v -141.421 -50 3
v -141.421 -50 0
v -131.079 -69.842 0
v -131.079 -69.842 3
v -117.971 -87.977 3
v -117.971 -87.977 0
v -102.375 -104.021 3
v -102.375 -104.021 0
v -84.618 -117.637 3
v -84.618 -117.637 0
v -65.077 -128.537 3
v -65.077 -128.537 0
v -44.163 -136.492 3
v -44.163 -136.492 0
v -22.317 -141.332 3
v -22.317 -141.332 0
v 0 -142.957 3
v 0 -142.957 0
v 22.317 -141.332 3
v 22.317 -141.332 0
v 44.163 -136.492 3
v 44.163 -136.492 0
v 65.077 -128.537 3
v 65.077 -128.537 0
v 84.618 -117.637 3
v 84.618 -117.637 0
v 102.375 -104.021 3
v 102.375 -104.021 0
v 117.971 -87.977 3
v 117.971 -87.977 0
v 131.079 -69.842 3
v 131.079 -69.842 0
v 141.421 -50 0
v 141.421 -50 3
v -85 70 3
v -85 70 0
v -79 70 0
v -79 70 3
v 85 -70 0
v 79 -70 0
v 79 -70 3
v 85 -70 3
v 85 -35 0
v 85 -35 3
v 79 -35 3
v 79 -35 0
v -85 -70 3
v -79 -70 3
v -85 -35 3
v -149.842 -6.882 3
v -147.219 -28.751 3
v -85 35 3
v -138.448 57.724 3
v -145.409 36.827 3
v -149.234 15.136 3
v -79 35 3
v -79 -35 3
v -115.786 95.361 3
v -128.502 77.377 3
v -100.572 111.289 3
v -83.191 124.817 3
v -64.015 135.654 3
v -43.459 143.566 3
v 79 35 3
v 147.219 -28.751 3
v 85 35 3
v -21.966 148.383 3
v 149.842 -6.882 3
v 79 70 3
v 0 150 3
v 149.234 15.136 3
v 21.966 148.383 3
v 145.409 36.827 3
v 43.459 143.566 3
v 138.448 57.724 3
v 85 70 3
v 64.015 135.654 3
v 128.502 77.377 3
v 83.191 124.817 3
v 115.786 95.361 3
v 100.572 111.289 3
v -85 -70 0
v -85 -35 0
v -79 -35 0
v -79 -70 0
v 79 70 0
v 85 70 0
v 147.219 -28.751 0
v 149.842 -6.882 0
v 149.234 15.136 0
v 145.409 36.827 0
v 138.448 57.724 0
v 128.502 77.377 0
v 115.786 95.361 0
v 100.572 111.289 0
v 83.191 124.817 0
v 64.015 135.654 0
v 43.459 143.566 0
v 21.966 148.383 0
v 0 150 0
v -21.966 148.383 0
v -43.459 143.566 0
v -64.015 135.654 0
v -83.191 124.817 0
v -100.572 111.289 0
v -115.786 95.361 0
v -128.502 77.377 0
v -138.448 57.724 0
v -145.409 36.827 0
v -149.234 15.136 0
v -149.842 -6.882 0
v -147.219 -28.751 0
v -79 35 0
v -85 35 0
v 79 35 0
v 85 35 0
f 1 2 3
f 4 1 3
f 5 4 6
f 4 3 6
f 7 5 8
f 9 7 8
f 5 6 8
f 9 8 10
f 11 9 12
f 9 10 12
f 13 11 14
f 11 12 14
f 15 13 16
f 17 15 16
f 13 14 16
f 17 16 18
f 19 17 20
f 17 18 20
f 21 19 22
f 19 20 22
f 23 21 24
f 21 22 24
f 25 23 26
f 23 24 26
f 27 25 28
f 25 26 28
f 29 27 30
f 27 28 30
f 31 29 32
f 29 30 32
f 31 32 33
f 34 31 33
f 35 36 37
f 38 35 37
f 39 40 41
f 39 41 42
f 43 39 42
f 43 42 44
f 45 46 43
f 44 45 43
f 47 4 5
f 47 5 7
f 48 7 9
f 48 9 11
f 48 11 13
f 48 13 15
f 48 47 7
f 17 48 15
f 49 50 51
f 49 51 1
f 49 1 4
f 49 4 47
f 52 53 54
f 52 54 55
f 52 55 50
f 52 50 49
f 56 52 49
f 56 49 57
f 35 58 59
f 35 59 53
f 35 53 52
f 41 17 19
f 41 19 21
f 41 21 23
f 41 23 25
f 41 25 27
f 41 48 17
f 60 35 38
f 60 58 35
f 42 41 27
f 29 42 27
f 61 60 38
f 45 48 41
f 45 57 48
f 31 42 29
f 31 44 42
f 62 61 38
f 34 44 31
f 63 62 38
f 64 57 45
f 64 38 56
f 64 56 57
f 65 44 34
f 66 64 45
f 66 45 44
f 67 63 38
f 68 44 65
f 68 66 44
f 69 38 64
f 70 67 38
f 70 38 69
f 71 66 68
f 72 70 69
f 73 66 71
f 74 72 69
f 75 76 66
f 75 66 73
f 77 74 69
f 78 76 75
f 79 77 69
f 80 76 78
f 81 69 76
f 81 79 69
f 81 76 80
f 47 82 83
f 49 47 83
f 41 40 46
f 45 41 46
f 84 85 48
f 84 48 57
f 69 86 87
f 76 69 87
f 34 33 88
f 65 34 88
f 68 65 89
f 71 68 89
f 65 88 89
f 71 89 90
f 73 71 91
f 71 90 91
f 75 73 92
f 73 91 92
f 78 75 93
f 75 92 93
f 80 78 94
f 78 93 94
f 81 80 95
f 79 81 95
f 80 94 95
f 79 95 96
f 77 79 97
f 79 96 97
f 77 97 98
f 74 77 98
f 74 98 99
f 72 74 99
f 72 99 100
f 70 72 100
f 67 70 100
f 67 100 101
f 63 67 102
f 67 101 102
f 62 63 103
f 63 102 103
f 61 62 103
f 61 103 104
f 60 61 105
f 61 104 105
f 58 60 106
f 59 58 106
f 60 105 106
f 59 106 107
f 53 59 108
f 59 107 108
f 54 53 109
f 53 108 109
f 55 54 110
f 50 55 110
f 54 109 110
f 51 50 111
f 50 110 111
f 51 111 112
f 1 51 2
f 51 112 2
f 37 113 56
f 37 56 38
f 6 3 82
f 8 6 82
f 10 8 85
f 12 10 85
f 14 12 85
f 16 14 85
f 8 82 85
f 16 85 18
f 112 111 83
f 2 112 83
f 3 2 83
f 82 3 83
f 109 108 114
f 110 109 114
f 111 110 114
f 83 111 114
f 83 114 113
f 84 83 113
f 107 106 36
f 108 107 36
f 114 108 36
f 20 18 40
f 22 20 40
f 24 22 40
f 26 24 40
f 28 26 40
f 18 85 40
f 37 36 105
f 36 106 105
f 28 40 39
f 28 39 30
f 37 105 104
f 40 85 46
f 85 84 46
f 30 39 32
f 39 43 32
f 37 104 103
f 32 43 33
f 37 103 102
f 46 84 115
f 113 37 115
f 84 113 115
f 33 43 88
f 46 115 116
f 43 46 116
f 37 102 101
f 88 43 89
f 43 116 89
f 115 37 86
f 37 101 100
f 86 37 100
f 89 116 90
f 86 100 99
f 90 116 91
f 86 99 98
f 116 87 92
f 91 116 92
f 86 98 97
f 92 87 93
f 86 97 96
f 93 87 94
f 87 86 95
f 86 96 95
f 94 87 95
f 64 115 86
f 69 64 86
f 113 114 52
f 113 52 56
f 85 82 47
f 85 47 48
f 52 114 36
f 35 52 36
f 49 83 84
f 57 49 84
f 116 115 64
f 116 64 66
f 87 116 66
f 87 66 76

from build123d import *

# Parameters (mm, degrees)
ESBO_O1_W                = 6
ESBO_O1_H                = 35
RESSALTO_EXTRUS_O1_DEPTH = 3


with BuildPart() as part:
    # Esboço1 → Ressalto-extrusão1 (new body)
    with BuildSketch(Plane.XY):
        with BuildLine():
            ThreePointArc((141.421356237, -50), (0, 150), (-141.421356237, -50))
            ThreePointArc((-141.421356237, -50), (0, -142.957457878), (141.421356237, -50))
        make_face()
        with Locations((-82, -52.5)):
            Rectangle(ESBO_O1_W, ESBO_O1_H, mode=Mode.SUBTRACT)
        with Locations((-82, 52.5)):
            Rectangle(ESBO_O1_W, ESBO_O1_H, mode=Mode.SUBTRACT)
        with Locations((82, -52.5)):
            Rectangle(ESBO_O1_W, ESBO_O1_H, mode=Mode.SUBTRACT)
        with Locations((82, 52.5)):
            Rectangle(ESBO_O1_W, ESBO_O1_H, mode=Mode.SUBTRACT)
    extrude(amount=RESSALTO_EXTRUS_O1_DEPTH)


solid = part.part
